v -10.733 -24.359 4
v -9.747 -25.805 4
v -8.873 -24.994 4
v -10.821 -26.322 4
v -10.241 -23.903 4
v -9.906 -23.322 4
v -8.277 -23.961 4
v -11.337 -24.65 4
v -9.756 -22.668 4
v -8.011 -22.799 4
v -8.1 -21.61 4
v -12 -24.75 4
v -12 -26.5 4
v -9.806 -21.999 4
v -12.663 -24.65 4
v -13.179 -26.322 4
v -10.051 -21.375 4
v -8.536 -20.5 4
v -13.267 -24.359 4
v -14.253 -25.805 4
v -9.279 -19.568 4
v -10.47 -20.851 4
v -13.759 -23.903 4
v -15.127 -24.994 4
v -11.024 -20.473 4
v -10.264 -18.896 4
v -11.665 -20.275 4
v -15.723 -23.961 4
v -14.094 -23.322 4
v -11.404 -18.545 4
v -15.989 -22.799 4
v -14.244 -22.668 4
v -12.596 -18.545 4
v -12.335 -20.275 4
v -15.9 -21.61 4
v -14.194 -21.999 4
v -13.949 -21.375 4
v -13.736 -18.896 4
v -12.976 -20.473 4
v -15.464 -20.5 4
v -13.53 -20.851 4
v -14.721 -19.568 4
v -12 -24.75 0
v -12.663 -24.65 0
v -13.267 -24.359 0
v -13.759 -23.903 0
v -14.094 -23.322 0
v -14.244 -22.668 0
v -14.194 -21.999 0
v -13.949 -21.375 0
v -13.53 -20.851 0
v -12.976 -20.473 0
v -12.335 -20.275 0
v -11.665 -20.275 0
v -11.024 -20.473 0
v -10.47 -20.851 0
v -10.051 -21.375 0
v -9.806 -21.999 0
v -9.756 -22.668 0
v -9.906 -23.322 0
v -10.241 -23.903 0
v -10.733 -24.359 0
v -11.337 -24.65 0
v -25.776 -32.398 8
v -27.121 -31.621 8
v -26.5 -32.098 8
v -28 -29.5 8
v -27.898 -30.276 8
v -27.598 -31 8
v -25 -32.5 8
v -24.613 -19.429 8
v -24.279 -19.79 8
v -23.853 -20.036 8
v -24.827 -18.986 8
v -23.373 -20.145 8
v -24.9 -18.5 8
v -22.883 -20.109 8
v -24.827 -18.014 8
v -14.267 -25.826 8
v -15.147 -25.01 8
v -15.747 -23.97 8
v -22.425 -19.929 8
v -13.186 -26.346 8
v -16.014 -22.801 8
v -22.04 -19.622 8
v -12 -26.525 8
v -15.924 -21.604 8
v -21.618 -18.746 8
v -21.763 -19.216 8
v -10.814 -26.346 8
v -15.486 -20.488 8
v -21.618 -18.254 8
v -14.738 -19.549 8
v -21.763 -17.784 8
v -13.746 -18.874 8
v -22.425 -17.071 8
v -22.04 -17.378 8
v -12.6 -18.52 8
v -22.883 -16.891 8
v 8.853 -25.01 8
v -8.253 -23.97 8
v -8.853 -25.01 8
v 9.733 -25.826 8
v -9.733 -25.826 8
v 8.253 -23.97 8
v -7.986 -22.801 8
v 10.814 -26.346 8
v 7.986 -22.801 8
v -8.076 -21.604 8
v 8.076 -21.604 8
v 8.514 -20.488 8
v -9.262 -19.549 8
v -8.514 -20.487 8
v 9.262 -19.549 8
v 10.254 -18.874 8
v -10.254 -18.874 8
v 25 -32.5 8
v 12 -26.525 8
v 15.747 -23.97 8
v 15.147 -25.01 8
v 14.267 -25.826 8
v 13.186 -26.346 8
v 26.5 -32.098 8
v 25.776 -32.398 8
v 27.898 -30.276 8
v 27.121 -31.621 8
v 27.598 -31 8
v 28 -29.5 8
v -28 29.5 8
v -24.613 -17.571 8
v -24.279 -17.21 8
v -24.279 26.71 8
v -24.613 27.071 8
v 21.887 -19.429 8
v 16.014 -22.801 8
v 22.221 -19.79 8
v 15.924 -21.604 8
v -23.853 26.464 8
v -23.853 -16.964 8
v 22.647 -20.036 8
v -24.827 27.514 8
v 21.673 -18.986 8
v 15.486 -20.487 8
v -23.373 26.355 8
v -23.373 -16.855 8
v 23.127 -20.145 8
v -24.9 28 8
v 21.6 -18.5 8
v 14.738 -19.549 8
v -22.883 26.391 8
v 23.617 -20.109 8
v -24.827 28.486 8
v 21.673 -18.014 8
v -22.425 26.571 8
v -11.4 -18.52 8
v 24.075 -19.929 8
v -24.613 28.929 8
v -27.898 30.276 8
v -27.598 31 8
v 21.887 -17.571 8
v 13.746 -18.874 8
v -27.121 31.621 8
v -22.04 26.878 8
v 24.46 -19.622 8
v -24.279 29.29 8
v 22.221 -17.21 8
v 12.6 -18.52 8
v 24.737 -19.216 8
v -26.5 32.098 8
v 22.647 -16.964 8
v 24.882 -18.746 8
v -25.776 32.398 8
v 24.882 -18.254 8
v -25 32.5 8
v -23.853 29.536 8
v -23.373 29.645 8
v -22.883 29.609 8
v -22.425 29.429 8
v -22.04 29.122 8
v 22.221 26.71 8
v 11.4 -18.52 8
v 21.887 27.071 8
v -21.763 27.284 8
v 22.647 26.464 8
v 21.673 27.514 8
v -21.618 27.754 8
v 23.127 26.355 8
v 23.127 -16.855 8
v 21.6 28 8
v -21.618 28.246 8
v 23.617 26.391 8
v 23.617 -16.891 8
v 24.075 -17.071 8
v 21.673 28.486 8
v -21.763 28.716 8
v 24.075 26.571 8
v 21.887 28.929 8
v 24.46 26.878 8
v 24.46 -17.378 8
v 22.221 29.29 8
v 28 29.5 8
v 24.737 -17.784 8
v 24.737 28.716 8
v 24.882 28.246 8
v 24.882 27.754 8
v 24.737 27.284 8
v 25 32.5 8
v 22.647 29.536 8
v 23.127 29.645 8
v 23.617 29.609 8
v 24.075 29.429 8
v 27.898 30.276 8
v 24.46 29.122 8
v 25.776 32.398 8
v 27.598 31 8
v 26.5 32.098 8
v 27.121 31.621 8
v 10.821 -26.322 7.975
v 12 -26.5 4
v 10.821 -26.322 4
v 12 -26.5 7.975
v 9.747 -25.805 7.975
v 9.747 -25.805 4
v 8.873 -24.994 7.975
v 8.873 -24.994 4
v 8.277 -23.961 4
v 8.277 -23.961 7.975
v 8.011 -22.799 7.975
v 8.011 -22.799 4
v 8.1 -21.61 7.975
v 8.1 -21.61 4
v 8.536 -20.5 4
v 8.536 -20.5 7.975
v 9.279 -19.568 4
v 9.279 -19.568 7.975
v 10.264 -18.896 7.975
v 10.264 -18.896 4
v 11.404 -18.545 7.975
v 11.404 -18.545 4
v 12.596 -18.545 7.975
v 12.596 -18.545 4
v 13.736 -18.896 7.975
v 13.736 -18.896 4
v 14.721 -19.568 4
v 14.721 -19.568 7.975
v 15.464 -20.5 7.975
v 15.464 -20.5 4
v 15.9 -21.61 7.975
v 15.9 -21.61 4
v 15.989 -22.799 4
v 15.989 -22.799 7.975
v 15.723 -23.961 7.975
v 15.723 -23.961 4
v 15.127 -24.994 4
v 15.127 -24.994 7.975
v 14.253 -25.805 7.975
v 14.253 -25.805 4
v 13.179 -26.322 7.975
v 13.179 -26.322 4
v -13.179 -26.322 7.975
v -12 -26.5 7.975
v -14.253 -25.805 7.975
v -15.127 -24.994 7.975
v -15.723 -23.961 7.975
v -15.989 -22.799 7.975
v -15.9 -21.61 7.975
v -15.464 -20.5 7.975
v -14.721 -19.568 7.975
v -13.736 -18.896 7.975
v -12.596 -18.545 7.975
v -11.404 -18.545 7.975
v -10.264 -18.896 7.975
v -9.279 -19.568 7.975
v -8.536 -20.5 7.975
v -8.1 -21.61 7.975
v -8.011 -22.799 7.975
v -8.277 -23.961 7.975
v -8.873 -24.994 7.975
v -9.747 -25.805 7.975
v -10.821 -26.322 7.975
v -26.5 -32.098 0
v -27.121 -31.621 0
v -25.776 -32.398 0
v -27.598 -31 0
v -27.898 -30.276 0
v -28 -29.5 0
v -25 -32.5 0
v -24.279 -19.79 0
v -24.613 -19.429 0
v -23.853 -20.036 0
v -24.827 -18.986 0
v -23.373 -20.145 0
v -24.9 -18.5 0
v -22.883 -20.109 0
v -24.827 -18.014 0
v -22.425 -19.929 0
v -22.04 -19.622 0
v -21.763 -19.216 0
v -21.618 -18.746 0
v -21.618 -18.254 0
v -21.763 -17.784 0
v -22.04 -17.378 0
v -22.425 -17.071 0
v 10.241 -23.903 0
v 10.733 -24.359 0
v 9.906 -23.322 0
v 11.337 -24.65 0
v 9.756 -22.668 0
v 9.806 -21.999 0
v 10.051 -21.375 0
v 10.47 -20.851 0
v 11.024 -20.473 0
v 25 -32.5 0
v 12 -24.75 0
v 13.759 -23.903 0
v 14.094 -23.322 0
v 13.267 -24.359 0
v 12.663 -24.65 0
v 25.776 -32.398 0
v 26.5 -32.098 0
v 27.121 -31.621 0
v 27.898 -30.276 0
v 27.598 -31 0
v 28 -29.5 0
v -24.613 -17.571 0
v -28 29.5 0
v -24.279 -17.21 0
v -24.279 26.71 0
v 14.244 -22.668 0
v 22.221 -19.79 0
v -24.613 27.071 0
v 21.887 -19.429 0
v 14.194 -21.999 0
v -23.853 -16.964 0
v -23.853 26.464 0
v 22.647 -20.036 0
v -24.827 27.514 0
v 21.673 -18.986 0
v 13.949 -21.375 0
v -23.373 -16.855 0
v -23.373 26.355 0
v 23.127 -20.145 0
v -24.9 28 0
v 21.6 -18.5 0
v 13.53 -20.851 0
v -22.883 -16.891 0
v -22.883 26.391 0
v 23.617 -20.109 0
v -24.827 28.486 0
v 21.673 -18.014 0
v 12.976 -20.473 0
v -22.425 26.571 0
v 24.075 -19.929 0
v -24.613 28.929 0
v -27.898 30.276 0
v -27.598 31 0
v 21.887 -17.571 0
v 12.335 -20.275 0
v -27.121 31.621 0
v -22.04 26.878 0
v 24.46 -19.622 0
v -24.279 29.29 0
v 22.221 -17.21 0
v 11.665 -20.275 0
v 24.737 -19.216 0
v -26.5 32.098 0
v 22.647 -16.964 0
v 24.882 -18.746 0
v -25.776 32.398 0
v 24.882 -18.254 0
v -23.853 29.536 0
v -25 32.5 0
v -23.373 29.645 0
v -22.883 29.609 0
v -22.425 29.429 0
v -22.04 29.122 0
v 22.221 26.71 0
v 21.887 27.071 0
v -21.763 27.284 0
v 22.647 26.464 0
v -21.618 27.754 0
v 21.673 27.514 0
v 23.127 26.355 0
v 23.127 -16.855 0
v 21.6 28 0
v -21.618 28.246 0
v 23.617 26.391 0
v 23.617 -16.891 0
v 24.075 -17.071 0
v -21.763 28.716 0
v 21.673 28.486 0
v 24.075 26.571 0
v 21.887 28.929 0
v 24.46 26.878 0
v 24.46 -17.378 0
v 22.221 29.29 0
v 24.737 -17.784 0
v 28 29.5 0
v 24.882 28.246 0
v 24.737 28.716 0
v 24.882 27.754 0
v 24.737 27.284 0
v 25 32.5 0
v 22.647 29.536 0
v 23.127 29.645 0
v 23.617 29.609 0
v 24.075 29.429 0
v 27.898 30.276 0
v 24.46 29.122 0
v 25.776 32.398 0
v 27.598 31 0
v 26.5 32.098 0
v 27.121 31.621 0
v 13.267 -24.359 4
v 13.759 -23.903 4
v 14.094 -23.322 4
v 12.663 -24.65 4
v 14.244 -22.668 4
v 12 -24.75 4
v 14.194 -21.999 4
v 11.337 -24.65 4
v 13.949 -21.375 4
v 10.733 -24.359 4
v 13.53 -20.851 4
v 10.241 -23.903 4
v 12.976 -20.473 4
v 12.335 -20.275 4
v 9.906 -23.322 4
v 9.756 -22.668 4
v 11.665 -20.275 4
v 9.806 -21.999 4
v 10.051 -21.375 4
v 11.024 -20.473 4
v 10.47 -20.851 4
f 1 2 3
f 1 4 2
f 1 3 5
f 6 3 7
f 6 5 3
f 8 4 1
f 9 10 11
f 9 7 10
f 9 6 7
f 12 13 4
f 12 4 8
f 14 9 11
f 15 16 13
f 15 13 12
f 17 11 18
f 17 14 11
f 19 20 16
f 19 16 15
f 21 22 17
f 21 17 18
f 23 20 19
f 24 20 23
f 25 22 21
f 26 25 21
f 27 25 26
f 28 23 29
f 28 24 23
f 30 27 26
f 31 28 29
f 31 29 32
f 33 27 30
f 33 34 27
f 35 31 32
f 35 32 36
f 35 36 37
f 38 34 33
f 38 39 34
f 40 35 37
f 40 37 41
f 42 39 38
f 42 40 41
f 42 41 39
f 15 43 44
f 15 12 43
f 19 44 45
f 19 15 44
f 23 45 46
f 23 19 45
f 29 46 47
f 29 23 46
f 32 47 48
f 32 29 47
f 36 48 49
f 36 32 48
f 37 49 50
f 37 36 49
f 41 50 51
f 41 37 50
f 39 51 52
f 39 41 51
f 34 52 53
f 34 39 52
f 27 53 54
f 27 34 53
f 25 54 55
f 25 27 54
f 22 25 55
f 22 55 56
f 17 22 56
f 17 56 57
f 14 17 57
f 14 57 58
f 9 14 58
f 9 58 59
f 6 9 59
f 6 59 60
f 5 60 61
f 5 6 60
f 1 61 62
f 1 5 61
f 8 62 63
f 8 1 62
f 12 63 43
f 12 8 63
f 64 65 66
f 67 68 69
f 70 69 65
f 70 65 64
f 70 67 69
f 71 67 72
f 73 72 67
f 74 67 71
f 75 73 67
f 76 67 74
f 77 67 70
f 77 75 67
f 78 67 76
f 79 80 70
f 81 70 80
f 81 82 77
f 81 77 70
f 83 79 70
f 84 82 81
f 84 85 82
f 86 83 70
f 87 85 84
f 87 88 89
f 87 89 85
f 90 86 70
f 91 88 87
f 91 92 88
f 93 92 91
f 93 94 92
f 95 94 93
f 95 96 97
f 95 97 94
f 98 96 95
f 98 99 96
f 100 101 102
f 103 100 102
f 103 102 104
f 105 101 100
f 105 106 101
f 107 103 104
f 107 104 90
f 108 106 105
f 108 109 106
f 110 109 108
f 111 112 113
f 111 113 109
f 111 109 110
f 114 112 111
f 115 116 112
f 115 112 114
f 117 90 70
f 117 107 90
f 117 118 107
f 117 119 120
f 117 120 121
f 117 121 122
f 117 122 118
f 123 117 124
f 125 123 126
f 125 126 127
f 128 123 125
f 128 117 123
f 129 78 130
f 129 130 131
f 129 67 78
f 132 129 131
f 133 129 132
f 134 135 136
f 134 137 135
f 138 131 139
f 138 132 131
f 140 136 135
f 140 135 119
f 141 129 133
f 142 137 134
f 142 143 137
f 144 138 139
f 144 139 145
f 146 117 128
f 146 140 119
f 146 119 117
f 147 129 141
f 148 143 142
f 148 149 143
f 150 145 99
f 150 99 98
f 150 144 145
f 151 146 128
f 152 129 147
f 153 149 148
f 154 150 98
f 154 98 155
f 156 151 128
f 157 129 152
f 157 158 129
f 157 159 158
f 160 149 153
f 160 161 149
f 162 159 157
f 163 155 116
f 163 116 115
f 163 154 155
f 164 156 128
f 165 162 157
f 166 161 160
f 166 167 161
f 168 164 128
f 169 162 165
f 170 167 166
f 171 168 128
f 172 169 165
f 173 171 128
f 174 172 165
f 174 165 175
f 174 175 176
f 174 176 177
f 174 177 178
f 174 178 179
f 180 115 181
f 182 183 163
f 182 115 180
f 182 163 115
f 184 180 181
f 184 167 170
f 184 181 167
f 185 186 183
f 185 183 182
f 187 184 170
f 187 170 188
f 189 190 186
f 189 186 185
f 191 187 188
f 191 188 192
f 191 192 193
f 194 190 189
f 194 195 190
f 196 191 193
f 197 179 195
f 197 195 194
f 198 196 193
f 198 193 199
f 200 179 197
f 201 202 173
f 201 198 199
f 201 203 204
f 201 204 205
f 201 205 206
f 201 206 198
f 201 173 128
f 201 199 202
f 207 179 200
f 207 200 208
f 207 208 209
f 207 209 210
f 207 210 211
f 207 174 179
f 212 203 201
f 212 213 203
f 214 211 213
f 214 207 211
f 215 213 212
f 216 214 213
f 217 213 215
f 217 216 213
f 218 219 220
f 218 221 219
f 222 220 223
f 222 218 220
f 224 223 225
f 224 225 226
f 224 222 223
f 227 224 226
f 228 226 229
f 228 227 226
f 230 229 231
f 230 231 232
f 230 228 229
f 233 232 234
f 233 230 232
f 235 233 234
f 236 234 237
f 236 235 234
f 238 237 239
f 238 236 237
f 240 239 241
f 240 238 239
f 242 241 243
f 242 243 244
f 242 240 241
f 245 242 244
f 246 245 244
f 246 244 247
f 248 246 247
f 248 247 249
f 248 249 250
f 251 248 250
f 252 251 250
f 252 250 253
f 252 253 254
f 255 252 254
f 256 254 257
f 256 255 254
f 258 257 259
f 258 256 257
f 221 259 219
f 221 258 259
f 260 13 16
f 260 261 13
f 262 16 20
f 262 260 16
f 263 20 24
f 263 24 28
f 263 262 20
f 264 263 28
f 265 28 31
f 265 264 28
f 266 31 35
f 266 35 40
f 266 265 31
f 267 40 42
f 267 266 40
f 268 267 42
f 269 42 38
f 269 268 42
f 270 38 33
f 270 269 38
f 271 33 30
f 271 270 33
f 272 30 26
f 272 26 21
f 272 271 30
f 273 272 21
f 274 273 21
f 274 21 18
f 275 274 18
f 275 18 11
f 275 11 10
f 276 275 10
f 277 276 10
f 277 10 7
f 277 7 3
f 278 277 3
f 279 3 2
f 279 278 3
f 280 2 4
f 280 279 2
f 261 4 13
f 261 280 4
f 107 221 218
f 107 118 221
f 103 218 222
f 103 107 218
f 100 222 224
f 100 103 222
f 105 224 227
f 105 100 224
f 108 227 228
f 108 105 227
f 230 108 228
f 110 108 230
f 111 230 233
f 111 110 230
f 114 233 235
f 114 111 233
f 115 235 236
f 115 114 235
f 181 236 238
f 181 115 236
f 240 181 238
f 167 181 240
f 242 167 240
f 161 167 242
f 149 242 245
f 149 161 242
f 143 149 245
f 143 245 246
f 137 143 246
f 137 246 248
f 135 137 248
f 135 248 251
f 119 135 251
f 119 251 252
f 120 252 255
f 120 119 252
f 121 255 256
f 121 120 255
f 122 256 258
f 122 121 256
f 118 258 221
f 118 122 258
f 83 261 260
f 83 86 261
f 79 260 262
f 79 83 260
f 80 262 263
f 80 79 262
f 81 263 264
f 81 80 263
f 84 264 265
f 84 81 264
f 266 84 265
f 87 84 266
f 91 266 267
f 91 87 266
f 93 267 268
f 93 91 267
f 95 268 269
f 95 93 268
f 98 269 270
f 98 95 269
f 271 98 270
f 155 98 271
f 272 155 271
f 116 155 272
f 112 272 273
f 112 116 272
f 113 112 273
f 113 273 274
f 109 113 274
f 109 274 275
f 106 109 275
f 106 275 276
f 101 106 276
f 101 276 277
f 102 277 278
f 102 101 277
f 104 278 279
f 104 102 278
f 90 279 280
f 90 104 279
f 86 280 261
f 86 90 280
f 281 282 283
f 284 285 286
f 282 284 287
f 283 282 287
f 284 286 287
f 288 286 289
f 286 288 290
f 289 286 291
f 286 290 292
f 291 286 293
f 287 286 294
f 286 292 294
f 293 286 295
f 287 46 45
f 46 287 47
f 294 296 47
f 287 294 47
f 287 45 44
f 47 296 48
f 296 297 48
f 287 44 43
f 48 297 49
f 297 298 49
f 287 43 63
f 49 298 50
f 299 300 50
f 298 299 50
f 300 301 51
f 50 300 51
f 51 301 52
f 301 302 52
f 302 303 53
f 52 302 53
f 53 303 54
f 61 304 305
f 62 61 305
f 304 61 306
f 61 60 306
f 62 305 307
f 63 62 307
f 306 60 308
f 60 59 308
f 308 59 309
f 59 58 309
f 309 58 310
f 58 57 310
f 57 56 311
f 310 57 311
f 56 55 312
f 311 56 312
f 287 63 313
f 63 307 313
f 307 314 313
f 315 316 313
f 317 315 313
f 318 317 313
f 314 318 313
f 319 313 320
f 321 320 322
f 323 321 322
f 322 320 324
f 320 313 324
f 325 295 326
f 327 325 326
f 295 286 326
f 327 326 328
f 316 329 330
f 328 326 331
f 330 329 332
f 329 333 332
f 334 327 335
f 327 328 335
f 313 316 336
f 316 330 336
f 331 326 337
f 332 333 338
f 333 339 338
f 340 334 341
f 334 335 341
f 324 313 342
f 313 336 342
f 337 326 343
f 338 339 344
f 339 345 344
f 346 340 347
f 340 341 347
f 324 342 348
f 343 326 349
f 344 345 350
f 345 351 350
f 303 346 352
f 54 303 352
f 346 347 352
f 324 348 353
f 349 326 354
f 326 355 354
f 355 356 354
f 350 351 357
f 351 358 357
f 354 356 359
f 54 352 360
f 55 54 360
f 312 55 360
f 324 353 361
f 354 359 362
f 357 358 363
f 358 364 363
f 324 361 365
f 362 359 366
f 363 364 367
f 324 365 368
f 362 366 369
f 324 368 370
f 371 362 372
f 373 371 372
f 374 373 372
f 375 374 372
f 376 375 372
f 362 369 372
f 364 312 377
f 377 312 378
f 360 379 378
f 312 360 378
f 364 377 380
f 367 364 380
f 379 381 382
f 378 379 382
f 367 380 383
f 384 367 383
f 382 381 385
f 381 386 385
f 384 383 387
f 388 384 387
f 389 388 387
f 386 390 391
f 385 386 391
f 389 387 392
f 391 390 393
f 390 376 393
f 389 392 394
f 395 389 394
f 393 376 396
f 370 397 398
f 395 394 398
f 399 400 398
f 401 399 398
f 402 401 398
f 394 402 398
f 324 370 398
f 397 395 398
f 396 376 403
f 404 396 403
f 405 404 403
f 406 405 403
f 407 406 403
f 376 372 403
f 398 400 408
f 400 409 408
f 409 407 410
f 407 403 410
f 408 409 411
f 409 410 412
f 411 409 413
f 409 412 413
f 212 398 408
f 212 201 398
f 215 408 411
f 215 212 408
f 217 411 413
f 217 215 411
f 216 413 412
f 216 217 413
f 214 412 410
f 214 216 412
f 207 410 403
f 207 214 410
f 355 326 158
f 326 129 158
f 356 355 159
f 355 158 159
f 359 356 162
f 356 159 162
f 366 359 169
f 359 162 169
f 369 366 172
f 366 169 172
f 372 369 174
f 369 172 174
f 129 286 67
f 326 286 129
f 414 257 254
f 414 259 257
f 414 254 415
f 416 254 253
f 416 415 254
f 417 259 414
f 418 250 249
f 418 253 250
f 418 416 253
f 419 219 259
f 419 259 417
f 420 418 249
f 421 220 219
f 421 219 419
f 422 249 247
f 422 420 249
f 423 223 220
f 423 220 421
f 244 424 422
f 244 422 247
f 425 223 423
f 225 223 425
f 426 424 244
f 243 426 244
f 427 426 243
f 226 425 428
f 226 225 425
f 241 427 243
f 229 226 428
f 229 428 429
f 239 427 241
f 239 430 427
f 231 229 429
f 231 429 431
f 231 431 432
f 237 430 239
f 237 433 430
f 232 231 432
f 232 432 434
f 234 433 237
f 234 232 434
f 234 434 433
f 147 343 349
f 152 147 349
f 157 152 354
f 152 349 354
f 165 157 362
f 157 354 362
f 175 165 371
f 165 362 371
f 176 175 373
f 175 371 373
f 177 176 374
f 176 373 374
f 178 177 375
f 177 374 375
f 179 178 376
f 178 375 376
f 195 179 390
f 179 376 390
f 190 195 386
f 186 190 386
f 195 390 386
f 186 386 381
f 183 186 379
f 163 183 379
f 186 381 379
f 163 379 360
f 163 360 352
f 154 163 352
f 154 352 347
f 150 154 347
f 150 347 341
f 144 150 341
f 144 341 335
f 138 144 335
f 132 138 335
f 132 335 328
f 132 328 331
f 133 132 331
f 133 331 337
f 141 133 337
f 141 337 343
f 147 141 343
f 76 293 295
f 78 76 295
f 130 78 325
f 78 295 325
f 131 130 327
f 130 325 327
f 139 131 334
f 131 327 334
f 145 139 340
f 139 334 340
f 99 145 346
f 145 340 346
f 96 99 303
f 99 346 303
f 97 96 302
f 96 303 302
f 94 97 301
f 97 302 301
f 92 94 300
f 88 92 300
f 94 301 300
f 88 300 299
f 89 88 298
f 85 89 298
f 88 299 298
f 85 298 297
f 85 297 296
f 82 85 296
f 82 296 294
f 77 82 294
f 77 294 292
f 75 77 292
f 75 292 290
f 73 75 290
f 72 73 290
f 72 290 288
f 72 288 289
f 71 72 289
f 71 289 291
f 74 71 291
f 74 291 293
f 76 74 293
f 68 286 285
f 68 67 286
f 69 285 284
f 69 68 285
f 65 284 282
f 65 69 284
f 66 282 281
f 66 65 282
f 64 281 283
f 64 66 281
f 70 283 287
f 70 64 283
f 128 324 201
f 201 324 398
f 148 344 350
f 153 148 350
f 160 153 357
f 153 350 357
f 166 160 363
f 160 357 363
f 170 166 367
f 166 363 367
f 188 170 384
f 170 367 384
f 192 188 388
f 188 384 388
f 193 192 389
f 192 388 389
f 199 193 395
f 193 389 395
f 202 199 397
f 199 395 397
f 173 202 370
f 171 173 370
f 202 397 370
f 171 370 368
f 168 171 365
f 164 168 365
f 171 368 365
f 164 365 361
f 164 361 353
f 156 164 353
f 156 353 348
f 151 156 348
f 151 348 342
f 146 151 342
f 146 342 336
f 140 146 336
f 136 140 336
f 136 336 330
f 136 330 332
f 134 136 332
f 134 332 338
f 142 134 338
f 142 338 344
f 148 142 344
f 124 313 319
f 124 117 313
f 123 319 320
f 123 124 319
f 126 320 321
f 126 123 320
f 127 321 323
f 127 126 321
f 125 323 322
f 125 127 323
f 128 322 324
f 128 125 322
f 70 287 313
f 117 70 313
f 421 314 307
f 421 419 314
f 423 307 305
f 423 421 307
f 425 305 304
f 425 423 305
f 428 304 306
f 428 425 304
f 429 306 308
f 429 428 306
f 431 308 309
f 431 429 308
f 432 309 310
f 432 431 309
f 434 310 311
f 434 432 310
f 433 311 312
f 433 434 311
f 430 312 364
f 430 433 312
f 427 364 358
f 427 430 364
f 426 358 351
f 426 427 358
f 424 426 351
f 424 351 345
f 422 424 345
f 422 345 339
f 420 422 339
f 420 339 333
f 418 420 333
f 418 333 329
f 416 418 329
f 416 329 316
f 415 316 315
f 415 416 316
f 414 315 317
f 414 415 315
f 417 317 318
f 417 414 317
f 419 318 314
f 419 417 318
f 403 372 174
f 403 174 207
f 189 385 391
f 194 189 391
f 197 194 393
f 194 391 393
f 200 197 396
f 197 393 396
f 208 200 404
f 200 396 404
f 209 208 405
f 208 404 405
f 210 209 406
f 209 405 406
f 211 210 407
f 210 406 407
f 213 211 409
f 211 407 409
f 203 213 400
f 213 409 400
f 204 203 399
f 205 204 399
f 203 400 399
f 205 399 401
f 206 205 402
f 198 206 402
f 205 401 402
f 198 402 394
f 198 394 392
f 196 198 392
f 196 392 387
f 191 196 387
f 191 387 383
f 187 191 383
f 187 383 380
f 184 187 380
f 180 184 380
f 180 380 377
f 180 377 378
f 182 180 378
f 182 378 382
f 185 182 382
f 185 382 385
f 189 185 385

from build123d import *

# Parameters (mm, degrees)
SKETCH1_W                     = 56
SKETCH1_H                     = 65
BOSS_EXTRUDE1_DEPTH           = 8
FILLET1_R                     = 3
CBORE_FOR_M4_SHCS1_AT_2_COUNT = 2
CBORE_FOR_M4_SHCS1_AT_2_PITCH = 24
M4X0_7_TAPPED_HOLE1_D         = 3.3
M4X0_7_TAPPED_HOLE1_DEPTH     = 10.1
M4X0_7_TAPPED_HOLE1_TIP       = 0.991420021


with BuildPart() as part:
    # Sketch1 → Boss-Extrude1 (new body)
    with BuildSketch(Plane.XY):
        Rectangle(SKETCH1_W, SKETCH1_H)
    extrude(amount=BOSS_EXTRUDE1_DEPTH)

    # Fillet1
    fillet1_edges = [part.edges().sort_by_distance(p)[0] for p in [
        (28, -32.5, 4),
        (-28, -32.5, 4),
        (-28, 32.5, 4),
        (28, 32.5, 4),
    ]]
    fillet(fillet1_edges, radius=FILLET1_R)

    # Sketch3 → CBORE for M4 SHCS1 (revolve, cut)
    with BuildSketch(Plane(origin=(-12, -22.5, 8), x_dir=(0, -1, 0), z_dir=(1, 0, 0))):
        Polygon((0, 0), (0, 8), (2.25, 8), (2.25, 4), (4, 4), (4, 0.025), (4.025, 0), align=None)
    cbore_for_m4_shcs1 = revolve(axis=Axis((-12, -22.5, 14.35), (0, 0, -1)), mode=Mode.SUBTRACT)

    # CBORE for M4 SHCS1 at 2: CBORE for M4 SHCS1 ×2
    with Locations(*[(i * CBORE_FOR_M4_SHCS1_AT_2_PITCH, 0, 0) for i in range(1, CBORE_FOR_M4_SHCS1_AT_2_COUNT)]):
        add(cbore_for_m4_shcs1, mode=Mode.SUBTRACT)

    # M4x0.7 Tapped Hole1
    with Locations(Plane.XY.offset(8)):
        with Locations((-23.25, -18.5), (23.25, -18.5), (23.25, 28), (-23.25, 28)):
            Hole(M4X0_7_TAPPED_HOLE1_D / 2, depth=M4X0_7_TAPPED_HOLE1_DEPTH)
            with Locations((0, 0, -(M4X0_7_TAPPED_HOLE1_DEPTH + M4X0_7_TAPPED_HOLE1_TIP / 2))):  # 118° drill point
                Cone(0, M4X0_7_TAPPED_HOLE1_D / 2, M4X0_7_TAPPED_HOLE1_TIP, mode=Mode.SUBTRACT)


solid = part.part
